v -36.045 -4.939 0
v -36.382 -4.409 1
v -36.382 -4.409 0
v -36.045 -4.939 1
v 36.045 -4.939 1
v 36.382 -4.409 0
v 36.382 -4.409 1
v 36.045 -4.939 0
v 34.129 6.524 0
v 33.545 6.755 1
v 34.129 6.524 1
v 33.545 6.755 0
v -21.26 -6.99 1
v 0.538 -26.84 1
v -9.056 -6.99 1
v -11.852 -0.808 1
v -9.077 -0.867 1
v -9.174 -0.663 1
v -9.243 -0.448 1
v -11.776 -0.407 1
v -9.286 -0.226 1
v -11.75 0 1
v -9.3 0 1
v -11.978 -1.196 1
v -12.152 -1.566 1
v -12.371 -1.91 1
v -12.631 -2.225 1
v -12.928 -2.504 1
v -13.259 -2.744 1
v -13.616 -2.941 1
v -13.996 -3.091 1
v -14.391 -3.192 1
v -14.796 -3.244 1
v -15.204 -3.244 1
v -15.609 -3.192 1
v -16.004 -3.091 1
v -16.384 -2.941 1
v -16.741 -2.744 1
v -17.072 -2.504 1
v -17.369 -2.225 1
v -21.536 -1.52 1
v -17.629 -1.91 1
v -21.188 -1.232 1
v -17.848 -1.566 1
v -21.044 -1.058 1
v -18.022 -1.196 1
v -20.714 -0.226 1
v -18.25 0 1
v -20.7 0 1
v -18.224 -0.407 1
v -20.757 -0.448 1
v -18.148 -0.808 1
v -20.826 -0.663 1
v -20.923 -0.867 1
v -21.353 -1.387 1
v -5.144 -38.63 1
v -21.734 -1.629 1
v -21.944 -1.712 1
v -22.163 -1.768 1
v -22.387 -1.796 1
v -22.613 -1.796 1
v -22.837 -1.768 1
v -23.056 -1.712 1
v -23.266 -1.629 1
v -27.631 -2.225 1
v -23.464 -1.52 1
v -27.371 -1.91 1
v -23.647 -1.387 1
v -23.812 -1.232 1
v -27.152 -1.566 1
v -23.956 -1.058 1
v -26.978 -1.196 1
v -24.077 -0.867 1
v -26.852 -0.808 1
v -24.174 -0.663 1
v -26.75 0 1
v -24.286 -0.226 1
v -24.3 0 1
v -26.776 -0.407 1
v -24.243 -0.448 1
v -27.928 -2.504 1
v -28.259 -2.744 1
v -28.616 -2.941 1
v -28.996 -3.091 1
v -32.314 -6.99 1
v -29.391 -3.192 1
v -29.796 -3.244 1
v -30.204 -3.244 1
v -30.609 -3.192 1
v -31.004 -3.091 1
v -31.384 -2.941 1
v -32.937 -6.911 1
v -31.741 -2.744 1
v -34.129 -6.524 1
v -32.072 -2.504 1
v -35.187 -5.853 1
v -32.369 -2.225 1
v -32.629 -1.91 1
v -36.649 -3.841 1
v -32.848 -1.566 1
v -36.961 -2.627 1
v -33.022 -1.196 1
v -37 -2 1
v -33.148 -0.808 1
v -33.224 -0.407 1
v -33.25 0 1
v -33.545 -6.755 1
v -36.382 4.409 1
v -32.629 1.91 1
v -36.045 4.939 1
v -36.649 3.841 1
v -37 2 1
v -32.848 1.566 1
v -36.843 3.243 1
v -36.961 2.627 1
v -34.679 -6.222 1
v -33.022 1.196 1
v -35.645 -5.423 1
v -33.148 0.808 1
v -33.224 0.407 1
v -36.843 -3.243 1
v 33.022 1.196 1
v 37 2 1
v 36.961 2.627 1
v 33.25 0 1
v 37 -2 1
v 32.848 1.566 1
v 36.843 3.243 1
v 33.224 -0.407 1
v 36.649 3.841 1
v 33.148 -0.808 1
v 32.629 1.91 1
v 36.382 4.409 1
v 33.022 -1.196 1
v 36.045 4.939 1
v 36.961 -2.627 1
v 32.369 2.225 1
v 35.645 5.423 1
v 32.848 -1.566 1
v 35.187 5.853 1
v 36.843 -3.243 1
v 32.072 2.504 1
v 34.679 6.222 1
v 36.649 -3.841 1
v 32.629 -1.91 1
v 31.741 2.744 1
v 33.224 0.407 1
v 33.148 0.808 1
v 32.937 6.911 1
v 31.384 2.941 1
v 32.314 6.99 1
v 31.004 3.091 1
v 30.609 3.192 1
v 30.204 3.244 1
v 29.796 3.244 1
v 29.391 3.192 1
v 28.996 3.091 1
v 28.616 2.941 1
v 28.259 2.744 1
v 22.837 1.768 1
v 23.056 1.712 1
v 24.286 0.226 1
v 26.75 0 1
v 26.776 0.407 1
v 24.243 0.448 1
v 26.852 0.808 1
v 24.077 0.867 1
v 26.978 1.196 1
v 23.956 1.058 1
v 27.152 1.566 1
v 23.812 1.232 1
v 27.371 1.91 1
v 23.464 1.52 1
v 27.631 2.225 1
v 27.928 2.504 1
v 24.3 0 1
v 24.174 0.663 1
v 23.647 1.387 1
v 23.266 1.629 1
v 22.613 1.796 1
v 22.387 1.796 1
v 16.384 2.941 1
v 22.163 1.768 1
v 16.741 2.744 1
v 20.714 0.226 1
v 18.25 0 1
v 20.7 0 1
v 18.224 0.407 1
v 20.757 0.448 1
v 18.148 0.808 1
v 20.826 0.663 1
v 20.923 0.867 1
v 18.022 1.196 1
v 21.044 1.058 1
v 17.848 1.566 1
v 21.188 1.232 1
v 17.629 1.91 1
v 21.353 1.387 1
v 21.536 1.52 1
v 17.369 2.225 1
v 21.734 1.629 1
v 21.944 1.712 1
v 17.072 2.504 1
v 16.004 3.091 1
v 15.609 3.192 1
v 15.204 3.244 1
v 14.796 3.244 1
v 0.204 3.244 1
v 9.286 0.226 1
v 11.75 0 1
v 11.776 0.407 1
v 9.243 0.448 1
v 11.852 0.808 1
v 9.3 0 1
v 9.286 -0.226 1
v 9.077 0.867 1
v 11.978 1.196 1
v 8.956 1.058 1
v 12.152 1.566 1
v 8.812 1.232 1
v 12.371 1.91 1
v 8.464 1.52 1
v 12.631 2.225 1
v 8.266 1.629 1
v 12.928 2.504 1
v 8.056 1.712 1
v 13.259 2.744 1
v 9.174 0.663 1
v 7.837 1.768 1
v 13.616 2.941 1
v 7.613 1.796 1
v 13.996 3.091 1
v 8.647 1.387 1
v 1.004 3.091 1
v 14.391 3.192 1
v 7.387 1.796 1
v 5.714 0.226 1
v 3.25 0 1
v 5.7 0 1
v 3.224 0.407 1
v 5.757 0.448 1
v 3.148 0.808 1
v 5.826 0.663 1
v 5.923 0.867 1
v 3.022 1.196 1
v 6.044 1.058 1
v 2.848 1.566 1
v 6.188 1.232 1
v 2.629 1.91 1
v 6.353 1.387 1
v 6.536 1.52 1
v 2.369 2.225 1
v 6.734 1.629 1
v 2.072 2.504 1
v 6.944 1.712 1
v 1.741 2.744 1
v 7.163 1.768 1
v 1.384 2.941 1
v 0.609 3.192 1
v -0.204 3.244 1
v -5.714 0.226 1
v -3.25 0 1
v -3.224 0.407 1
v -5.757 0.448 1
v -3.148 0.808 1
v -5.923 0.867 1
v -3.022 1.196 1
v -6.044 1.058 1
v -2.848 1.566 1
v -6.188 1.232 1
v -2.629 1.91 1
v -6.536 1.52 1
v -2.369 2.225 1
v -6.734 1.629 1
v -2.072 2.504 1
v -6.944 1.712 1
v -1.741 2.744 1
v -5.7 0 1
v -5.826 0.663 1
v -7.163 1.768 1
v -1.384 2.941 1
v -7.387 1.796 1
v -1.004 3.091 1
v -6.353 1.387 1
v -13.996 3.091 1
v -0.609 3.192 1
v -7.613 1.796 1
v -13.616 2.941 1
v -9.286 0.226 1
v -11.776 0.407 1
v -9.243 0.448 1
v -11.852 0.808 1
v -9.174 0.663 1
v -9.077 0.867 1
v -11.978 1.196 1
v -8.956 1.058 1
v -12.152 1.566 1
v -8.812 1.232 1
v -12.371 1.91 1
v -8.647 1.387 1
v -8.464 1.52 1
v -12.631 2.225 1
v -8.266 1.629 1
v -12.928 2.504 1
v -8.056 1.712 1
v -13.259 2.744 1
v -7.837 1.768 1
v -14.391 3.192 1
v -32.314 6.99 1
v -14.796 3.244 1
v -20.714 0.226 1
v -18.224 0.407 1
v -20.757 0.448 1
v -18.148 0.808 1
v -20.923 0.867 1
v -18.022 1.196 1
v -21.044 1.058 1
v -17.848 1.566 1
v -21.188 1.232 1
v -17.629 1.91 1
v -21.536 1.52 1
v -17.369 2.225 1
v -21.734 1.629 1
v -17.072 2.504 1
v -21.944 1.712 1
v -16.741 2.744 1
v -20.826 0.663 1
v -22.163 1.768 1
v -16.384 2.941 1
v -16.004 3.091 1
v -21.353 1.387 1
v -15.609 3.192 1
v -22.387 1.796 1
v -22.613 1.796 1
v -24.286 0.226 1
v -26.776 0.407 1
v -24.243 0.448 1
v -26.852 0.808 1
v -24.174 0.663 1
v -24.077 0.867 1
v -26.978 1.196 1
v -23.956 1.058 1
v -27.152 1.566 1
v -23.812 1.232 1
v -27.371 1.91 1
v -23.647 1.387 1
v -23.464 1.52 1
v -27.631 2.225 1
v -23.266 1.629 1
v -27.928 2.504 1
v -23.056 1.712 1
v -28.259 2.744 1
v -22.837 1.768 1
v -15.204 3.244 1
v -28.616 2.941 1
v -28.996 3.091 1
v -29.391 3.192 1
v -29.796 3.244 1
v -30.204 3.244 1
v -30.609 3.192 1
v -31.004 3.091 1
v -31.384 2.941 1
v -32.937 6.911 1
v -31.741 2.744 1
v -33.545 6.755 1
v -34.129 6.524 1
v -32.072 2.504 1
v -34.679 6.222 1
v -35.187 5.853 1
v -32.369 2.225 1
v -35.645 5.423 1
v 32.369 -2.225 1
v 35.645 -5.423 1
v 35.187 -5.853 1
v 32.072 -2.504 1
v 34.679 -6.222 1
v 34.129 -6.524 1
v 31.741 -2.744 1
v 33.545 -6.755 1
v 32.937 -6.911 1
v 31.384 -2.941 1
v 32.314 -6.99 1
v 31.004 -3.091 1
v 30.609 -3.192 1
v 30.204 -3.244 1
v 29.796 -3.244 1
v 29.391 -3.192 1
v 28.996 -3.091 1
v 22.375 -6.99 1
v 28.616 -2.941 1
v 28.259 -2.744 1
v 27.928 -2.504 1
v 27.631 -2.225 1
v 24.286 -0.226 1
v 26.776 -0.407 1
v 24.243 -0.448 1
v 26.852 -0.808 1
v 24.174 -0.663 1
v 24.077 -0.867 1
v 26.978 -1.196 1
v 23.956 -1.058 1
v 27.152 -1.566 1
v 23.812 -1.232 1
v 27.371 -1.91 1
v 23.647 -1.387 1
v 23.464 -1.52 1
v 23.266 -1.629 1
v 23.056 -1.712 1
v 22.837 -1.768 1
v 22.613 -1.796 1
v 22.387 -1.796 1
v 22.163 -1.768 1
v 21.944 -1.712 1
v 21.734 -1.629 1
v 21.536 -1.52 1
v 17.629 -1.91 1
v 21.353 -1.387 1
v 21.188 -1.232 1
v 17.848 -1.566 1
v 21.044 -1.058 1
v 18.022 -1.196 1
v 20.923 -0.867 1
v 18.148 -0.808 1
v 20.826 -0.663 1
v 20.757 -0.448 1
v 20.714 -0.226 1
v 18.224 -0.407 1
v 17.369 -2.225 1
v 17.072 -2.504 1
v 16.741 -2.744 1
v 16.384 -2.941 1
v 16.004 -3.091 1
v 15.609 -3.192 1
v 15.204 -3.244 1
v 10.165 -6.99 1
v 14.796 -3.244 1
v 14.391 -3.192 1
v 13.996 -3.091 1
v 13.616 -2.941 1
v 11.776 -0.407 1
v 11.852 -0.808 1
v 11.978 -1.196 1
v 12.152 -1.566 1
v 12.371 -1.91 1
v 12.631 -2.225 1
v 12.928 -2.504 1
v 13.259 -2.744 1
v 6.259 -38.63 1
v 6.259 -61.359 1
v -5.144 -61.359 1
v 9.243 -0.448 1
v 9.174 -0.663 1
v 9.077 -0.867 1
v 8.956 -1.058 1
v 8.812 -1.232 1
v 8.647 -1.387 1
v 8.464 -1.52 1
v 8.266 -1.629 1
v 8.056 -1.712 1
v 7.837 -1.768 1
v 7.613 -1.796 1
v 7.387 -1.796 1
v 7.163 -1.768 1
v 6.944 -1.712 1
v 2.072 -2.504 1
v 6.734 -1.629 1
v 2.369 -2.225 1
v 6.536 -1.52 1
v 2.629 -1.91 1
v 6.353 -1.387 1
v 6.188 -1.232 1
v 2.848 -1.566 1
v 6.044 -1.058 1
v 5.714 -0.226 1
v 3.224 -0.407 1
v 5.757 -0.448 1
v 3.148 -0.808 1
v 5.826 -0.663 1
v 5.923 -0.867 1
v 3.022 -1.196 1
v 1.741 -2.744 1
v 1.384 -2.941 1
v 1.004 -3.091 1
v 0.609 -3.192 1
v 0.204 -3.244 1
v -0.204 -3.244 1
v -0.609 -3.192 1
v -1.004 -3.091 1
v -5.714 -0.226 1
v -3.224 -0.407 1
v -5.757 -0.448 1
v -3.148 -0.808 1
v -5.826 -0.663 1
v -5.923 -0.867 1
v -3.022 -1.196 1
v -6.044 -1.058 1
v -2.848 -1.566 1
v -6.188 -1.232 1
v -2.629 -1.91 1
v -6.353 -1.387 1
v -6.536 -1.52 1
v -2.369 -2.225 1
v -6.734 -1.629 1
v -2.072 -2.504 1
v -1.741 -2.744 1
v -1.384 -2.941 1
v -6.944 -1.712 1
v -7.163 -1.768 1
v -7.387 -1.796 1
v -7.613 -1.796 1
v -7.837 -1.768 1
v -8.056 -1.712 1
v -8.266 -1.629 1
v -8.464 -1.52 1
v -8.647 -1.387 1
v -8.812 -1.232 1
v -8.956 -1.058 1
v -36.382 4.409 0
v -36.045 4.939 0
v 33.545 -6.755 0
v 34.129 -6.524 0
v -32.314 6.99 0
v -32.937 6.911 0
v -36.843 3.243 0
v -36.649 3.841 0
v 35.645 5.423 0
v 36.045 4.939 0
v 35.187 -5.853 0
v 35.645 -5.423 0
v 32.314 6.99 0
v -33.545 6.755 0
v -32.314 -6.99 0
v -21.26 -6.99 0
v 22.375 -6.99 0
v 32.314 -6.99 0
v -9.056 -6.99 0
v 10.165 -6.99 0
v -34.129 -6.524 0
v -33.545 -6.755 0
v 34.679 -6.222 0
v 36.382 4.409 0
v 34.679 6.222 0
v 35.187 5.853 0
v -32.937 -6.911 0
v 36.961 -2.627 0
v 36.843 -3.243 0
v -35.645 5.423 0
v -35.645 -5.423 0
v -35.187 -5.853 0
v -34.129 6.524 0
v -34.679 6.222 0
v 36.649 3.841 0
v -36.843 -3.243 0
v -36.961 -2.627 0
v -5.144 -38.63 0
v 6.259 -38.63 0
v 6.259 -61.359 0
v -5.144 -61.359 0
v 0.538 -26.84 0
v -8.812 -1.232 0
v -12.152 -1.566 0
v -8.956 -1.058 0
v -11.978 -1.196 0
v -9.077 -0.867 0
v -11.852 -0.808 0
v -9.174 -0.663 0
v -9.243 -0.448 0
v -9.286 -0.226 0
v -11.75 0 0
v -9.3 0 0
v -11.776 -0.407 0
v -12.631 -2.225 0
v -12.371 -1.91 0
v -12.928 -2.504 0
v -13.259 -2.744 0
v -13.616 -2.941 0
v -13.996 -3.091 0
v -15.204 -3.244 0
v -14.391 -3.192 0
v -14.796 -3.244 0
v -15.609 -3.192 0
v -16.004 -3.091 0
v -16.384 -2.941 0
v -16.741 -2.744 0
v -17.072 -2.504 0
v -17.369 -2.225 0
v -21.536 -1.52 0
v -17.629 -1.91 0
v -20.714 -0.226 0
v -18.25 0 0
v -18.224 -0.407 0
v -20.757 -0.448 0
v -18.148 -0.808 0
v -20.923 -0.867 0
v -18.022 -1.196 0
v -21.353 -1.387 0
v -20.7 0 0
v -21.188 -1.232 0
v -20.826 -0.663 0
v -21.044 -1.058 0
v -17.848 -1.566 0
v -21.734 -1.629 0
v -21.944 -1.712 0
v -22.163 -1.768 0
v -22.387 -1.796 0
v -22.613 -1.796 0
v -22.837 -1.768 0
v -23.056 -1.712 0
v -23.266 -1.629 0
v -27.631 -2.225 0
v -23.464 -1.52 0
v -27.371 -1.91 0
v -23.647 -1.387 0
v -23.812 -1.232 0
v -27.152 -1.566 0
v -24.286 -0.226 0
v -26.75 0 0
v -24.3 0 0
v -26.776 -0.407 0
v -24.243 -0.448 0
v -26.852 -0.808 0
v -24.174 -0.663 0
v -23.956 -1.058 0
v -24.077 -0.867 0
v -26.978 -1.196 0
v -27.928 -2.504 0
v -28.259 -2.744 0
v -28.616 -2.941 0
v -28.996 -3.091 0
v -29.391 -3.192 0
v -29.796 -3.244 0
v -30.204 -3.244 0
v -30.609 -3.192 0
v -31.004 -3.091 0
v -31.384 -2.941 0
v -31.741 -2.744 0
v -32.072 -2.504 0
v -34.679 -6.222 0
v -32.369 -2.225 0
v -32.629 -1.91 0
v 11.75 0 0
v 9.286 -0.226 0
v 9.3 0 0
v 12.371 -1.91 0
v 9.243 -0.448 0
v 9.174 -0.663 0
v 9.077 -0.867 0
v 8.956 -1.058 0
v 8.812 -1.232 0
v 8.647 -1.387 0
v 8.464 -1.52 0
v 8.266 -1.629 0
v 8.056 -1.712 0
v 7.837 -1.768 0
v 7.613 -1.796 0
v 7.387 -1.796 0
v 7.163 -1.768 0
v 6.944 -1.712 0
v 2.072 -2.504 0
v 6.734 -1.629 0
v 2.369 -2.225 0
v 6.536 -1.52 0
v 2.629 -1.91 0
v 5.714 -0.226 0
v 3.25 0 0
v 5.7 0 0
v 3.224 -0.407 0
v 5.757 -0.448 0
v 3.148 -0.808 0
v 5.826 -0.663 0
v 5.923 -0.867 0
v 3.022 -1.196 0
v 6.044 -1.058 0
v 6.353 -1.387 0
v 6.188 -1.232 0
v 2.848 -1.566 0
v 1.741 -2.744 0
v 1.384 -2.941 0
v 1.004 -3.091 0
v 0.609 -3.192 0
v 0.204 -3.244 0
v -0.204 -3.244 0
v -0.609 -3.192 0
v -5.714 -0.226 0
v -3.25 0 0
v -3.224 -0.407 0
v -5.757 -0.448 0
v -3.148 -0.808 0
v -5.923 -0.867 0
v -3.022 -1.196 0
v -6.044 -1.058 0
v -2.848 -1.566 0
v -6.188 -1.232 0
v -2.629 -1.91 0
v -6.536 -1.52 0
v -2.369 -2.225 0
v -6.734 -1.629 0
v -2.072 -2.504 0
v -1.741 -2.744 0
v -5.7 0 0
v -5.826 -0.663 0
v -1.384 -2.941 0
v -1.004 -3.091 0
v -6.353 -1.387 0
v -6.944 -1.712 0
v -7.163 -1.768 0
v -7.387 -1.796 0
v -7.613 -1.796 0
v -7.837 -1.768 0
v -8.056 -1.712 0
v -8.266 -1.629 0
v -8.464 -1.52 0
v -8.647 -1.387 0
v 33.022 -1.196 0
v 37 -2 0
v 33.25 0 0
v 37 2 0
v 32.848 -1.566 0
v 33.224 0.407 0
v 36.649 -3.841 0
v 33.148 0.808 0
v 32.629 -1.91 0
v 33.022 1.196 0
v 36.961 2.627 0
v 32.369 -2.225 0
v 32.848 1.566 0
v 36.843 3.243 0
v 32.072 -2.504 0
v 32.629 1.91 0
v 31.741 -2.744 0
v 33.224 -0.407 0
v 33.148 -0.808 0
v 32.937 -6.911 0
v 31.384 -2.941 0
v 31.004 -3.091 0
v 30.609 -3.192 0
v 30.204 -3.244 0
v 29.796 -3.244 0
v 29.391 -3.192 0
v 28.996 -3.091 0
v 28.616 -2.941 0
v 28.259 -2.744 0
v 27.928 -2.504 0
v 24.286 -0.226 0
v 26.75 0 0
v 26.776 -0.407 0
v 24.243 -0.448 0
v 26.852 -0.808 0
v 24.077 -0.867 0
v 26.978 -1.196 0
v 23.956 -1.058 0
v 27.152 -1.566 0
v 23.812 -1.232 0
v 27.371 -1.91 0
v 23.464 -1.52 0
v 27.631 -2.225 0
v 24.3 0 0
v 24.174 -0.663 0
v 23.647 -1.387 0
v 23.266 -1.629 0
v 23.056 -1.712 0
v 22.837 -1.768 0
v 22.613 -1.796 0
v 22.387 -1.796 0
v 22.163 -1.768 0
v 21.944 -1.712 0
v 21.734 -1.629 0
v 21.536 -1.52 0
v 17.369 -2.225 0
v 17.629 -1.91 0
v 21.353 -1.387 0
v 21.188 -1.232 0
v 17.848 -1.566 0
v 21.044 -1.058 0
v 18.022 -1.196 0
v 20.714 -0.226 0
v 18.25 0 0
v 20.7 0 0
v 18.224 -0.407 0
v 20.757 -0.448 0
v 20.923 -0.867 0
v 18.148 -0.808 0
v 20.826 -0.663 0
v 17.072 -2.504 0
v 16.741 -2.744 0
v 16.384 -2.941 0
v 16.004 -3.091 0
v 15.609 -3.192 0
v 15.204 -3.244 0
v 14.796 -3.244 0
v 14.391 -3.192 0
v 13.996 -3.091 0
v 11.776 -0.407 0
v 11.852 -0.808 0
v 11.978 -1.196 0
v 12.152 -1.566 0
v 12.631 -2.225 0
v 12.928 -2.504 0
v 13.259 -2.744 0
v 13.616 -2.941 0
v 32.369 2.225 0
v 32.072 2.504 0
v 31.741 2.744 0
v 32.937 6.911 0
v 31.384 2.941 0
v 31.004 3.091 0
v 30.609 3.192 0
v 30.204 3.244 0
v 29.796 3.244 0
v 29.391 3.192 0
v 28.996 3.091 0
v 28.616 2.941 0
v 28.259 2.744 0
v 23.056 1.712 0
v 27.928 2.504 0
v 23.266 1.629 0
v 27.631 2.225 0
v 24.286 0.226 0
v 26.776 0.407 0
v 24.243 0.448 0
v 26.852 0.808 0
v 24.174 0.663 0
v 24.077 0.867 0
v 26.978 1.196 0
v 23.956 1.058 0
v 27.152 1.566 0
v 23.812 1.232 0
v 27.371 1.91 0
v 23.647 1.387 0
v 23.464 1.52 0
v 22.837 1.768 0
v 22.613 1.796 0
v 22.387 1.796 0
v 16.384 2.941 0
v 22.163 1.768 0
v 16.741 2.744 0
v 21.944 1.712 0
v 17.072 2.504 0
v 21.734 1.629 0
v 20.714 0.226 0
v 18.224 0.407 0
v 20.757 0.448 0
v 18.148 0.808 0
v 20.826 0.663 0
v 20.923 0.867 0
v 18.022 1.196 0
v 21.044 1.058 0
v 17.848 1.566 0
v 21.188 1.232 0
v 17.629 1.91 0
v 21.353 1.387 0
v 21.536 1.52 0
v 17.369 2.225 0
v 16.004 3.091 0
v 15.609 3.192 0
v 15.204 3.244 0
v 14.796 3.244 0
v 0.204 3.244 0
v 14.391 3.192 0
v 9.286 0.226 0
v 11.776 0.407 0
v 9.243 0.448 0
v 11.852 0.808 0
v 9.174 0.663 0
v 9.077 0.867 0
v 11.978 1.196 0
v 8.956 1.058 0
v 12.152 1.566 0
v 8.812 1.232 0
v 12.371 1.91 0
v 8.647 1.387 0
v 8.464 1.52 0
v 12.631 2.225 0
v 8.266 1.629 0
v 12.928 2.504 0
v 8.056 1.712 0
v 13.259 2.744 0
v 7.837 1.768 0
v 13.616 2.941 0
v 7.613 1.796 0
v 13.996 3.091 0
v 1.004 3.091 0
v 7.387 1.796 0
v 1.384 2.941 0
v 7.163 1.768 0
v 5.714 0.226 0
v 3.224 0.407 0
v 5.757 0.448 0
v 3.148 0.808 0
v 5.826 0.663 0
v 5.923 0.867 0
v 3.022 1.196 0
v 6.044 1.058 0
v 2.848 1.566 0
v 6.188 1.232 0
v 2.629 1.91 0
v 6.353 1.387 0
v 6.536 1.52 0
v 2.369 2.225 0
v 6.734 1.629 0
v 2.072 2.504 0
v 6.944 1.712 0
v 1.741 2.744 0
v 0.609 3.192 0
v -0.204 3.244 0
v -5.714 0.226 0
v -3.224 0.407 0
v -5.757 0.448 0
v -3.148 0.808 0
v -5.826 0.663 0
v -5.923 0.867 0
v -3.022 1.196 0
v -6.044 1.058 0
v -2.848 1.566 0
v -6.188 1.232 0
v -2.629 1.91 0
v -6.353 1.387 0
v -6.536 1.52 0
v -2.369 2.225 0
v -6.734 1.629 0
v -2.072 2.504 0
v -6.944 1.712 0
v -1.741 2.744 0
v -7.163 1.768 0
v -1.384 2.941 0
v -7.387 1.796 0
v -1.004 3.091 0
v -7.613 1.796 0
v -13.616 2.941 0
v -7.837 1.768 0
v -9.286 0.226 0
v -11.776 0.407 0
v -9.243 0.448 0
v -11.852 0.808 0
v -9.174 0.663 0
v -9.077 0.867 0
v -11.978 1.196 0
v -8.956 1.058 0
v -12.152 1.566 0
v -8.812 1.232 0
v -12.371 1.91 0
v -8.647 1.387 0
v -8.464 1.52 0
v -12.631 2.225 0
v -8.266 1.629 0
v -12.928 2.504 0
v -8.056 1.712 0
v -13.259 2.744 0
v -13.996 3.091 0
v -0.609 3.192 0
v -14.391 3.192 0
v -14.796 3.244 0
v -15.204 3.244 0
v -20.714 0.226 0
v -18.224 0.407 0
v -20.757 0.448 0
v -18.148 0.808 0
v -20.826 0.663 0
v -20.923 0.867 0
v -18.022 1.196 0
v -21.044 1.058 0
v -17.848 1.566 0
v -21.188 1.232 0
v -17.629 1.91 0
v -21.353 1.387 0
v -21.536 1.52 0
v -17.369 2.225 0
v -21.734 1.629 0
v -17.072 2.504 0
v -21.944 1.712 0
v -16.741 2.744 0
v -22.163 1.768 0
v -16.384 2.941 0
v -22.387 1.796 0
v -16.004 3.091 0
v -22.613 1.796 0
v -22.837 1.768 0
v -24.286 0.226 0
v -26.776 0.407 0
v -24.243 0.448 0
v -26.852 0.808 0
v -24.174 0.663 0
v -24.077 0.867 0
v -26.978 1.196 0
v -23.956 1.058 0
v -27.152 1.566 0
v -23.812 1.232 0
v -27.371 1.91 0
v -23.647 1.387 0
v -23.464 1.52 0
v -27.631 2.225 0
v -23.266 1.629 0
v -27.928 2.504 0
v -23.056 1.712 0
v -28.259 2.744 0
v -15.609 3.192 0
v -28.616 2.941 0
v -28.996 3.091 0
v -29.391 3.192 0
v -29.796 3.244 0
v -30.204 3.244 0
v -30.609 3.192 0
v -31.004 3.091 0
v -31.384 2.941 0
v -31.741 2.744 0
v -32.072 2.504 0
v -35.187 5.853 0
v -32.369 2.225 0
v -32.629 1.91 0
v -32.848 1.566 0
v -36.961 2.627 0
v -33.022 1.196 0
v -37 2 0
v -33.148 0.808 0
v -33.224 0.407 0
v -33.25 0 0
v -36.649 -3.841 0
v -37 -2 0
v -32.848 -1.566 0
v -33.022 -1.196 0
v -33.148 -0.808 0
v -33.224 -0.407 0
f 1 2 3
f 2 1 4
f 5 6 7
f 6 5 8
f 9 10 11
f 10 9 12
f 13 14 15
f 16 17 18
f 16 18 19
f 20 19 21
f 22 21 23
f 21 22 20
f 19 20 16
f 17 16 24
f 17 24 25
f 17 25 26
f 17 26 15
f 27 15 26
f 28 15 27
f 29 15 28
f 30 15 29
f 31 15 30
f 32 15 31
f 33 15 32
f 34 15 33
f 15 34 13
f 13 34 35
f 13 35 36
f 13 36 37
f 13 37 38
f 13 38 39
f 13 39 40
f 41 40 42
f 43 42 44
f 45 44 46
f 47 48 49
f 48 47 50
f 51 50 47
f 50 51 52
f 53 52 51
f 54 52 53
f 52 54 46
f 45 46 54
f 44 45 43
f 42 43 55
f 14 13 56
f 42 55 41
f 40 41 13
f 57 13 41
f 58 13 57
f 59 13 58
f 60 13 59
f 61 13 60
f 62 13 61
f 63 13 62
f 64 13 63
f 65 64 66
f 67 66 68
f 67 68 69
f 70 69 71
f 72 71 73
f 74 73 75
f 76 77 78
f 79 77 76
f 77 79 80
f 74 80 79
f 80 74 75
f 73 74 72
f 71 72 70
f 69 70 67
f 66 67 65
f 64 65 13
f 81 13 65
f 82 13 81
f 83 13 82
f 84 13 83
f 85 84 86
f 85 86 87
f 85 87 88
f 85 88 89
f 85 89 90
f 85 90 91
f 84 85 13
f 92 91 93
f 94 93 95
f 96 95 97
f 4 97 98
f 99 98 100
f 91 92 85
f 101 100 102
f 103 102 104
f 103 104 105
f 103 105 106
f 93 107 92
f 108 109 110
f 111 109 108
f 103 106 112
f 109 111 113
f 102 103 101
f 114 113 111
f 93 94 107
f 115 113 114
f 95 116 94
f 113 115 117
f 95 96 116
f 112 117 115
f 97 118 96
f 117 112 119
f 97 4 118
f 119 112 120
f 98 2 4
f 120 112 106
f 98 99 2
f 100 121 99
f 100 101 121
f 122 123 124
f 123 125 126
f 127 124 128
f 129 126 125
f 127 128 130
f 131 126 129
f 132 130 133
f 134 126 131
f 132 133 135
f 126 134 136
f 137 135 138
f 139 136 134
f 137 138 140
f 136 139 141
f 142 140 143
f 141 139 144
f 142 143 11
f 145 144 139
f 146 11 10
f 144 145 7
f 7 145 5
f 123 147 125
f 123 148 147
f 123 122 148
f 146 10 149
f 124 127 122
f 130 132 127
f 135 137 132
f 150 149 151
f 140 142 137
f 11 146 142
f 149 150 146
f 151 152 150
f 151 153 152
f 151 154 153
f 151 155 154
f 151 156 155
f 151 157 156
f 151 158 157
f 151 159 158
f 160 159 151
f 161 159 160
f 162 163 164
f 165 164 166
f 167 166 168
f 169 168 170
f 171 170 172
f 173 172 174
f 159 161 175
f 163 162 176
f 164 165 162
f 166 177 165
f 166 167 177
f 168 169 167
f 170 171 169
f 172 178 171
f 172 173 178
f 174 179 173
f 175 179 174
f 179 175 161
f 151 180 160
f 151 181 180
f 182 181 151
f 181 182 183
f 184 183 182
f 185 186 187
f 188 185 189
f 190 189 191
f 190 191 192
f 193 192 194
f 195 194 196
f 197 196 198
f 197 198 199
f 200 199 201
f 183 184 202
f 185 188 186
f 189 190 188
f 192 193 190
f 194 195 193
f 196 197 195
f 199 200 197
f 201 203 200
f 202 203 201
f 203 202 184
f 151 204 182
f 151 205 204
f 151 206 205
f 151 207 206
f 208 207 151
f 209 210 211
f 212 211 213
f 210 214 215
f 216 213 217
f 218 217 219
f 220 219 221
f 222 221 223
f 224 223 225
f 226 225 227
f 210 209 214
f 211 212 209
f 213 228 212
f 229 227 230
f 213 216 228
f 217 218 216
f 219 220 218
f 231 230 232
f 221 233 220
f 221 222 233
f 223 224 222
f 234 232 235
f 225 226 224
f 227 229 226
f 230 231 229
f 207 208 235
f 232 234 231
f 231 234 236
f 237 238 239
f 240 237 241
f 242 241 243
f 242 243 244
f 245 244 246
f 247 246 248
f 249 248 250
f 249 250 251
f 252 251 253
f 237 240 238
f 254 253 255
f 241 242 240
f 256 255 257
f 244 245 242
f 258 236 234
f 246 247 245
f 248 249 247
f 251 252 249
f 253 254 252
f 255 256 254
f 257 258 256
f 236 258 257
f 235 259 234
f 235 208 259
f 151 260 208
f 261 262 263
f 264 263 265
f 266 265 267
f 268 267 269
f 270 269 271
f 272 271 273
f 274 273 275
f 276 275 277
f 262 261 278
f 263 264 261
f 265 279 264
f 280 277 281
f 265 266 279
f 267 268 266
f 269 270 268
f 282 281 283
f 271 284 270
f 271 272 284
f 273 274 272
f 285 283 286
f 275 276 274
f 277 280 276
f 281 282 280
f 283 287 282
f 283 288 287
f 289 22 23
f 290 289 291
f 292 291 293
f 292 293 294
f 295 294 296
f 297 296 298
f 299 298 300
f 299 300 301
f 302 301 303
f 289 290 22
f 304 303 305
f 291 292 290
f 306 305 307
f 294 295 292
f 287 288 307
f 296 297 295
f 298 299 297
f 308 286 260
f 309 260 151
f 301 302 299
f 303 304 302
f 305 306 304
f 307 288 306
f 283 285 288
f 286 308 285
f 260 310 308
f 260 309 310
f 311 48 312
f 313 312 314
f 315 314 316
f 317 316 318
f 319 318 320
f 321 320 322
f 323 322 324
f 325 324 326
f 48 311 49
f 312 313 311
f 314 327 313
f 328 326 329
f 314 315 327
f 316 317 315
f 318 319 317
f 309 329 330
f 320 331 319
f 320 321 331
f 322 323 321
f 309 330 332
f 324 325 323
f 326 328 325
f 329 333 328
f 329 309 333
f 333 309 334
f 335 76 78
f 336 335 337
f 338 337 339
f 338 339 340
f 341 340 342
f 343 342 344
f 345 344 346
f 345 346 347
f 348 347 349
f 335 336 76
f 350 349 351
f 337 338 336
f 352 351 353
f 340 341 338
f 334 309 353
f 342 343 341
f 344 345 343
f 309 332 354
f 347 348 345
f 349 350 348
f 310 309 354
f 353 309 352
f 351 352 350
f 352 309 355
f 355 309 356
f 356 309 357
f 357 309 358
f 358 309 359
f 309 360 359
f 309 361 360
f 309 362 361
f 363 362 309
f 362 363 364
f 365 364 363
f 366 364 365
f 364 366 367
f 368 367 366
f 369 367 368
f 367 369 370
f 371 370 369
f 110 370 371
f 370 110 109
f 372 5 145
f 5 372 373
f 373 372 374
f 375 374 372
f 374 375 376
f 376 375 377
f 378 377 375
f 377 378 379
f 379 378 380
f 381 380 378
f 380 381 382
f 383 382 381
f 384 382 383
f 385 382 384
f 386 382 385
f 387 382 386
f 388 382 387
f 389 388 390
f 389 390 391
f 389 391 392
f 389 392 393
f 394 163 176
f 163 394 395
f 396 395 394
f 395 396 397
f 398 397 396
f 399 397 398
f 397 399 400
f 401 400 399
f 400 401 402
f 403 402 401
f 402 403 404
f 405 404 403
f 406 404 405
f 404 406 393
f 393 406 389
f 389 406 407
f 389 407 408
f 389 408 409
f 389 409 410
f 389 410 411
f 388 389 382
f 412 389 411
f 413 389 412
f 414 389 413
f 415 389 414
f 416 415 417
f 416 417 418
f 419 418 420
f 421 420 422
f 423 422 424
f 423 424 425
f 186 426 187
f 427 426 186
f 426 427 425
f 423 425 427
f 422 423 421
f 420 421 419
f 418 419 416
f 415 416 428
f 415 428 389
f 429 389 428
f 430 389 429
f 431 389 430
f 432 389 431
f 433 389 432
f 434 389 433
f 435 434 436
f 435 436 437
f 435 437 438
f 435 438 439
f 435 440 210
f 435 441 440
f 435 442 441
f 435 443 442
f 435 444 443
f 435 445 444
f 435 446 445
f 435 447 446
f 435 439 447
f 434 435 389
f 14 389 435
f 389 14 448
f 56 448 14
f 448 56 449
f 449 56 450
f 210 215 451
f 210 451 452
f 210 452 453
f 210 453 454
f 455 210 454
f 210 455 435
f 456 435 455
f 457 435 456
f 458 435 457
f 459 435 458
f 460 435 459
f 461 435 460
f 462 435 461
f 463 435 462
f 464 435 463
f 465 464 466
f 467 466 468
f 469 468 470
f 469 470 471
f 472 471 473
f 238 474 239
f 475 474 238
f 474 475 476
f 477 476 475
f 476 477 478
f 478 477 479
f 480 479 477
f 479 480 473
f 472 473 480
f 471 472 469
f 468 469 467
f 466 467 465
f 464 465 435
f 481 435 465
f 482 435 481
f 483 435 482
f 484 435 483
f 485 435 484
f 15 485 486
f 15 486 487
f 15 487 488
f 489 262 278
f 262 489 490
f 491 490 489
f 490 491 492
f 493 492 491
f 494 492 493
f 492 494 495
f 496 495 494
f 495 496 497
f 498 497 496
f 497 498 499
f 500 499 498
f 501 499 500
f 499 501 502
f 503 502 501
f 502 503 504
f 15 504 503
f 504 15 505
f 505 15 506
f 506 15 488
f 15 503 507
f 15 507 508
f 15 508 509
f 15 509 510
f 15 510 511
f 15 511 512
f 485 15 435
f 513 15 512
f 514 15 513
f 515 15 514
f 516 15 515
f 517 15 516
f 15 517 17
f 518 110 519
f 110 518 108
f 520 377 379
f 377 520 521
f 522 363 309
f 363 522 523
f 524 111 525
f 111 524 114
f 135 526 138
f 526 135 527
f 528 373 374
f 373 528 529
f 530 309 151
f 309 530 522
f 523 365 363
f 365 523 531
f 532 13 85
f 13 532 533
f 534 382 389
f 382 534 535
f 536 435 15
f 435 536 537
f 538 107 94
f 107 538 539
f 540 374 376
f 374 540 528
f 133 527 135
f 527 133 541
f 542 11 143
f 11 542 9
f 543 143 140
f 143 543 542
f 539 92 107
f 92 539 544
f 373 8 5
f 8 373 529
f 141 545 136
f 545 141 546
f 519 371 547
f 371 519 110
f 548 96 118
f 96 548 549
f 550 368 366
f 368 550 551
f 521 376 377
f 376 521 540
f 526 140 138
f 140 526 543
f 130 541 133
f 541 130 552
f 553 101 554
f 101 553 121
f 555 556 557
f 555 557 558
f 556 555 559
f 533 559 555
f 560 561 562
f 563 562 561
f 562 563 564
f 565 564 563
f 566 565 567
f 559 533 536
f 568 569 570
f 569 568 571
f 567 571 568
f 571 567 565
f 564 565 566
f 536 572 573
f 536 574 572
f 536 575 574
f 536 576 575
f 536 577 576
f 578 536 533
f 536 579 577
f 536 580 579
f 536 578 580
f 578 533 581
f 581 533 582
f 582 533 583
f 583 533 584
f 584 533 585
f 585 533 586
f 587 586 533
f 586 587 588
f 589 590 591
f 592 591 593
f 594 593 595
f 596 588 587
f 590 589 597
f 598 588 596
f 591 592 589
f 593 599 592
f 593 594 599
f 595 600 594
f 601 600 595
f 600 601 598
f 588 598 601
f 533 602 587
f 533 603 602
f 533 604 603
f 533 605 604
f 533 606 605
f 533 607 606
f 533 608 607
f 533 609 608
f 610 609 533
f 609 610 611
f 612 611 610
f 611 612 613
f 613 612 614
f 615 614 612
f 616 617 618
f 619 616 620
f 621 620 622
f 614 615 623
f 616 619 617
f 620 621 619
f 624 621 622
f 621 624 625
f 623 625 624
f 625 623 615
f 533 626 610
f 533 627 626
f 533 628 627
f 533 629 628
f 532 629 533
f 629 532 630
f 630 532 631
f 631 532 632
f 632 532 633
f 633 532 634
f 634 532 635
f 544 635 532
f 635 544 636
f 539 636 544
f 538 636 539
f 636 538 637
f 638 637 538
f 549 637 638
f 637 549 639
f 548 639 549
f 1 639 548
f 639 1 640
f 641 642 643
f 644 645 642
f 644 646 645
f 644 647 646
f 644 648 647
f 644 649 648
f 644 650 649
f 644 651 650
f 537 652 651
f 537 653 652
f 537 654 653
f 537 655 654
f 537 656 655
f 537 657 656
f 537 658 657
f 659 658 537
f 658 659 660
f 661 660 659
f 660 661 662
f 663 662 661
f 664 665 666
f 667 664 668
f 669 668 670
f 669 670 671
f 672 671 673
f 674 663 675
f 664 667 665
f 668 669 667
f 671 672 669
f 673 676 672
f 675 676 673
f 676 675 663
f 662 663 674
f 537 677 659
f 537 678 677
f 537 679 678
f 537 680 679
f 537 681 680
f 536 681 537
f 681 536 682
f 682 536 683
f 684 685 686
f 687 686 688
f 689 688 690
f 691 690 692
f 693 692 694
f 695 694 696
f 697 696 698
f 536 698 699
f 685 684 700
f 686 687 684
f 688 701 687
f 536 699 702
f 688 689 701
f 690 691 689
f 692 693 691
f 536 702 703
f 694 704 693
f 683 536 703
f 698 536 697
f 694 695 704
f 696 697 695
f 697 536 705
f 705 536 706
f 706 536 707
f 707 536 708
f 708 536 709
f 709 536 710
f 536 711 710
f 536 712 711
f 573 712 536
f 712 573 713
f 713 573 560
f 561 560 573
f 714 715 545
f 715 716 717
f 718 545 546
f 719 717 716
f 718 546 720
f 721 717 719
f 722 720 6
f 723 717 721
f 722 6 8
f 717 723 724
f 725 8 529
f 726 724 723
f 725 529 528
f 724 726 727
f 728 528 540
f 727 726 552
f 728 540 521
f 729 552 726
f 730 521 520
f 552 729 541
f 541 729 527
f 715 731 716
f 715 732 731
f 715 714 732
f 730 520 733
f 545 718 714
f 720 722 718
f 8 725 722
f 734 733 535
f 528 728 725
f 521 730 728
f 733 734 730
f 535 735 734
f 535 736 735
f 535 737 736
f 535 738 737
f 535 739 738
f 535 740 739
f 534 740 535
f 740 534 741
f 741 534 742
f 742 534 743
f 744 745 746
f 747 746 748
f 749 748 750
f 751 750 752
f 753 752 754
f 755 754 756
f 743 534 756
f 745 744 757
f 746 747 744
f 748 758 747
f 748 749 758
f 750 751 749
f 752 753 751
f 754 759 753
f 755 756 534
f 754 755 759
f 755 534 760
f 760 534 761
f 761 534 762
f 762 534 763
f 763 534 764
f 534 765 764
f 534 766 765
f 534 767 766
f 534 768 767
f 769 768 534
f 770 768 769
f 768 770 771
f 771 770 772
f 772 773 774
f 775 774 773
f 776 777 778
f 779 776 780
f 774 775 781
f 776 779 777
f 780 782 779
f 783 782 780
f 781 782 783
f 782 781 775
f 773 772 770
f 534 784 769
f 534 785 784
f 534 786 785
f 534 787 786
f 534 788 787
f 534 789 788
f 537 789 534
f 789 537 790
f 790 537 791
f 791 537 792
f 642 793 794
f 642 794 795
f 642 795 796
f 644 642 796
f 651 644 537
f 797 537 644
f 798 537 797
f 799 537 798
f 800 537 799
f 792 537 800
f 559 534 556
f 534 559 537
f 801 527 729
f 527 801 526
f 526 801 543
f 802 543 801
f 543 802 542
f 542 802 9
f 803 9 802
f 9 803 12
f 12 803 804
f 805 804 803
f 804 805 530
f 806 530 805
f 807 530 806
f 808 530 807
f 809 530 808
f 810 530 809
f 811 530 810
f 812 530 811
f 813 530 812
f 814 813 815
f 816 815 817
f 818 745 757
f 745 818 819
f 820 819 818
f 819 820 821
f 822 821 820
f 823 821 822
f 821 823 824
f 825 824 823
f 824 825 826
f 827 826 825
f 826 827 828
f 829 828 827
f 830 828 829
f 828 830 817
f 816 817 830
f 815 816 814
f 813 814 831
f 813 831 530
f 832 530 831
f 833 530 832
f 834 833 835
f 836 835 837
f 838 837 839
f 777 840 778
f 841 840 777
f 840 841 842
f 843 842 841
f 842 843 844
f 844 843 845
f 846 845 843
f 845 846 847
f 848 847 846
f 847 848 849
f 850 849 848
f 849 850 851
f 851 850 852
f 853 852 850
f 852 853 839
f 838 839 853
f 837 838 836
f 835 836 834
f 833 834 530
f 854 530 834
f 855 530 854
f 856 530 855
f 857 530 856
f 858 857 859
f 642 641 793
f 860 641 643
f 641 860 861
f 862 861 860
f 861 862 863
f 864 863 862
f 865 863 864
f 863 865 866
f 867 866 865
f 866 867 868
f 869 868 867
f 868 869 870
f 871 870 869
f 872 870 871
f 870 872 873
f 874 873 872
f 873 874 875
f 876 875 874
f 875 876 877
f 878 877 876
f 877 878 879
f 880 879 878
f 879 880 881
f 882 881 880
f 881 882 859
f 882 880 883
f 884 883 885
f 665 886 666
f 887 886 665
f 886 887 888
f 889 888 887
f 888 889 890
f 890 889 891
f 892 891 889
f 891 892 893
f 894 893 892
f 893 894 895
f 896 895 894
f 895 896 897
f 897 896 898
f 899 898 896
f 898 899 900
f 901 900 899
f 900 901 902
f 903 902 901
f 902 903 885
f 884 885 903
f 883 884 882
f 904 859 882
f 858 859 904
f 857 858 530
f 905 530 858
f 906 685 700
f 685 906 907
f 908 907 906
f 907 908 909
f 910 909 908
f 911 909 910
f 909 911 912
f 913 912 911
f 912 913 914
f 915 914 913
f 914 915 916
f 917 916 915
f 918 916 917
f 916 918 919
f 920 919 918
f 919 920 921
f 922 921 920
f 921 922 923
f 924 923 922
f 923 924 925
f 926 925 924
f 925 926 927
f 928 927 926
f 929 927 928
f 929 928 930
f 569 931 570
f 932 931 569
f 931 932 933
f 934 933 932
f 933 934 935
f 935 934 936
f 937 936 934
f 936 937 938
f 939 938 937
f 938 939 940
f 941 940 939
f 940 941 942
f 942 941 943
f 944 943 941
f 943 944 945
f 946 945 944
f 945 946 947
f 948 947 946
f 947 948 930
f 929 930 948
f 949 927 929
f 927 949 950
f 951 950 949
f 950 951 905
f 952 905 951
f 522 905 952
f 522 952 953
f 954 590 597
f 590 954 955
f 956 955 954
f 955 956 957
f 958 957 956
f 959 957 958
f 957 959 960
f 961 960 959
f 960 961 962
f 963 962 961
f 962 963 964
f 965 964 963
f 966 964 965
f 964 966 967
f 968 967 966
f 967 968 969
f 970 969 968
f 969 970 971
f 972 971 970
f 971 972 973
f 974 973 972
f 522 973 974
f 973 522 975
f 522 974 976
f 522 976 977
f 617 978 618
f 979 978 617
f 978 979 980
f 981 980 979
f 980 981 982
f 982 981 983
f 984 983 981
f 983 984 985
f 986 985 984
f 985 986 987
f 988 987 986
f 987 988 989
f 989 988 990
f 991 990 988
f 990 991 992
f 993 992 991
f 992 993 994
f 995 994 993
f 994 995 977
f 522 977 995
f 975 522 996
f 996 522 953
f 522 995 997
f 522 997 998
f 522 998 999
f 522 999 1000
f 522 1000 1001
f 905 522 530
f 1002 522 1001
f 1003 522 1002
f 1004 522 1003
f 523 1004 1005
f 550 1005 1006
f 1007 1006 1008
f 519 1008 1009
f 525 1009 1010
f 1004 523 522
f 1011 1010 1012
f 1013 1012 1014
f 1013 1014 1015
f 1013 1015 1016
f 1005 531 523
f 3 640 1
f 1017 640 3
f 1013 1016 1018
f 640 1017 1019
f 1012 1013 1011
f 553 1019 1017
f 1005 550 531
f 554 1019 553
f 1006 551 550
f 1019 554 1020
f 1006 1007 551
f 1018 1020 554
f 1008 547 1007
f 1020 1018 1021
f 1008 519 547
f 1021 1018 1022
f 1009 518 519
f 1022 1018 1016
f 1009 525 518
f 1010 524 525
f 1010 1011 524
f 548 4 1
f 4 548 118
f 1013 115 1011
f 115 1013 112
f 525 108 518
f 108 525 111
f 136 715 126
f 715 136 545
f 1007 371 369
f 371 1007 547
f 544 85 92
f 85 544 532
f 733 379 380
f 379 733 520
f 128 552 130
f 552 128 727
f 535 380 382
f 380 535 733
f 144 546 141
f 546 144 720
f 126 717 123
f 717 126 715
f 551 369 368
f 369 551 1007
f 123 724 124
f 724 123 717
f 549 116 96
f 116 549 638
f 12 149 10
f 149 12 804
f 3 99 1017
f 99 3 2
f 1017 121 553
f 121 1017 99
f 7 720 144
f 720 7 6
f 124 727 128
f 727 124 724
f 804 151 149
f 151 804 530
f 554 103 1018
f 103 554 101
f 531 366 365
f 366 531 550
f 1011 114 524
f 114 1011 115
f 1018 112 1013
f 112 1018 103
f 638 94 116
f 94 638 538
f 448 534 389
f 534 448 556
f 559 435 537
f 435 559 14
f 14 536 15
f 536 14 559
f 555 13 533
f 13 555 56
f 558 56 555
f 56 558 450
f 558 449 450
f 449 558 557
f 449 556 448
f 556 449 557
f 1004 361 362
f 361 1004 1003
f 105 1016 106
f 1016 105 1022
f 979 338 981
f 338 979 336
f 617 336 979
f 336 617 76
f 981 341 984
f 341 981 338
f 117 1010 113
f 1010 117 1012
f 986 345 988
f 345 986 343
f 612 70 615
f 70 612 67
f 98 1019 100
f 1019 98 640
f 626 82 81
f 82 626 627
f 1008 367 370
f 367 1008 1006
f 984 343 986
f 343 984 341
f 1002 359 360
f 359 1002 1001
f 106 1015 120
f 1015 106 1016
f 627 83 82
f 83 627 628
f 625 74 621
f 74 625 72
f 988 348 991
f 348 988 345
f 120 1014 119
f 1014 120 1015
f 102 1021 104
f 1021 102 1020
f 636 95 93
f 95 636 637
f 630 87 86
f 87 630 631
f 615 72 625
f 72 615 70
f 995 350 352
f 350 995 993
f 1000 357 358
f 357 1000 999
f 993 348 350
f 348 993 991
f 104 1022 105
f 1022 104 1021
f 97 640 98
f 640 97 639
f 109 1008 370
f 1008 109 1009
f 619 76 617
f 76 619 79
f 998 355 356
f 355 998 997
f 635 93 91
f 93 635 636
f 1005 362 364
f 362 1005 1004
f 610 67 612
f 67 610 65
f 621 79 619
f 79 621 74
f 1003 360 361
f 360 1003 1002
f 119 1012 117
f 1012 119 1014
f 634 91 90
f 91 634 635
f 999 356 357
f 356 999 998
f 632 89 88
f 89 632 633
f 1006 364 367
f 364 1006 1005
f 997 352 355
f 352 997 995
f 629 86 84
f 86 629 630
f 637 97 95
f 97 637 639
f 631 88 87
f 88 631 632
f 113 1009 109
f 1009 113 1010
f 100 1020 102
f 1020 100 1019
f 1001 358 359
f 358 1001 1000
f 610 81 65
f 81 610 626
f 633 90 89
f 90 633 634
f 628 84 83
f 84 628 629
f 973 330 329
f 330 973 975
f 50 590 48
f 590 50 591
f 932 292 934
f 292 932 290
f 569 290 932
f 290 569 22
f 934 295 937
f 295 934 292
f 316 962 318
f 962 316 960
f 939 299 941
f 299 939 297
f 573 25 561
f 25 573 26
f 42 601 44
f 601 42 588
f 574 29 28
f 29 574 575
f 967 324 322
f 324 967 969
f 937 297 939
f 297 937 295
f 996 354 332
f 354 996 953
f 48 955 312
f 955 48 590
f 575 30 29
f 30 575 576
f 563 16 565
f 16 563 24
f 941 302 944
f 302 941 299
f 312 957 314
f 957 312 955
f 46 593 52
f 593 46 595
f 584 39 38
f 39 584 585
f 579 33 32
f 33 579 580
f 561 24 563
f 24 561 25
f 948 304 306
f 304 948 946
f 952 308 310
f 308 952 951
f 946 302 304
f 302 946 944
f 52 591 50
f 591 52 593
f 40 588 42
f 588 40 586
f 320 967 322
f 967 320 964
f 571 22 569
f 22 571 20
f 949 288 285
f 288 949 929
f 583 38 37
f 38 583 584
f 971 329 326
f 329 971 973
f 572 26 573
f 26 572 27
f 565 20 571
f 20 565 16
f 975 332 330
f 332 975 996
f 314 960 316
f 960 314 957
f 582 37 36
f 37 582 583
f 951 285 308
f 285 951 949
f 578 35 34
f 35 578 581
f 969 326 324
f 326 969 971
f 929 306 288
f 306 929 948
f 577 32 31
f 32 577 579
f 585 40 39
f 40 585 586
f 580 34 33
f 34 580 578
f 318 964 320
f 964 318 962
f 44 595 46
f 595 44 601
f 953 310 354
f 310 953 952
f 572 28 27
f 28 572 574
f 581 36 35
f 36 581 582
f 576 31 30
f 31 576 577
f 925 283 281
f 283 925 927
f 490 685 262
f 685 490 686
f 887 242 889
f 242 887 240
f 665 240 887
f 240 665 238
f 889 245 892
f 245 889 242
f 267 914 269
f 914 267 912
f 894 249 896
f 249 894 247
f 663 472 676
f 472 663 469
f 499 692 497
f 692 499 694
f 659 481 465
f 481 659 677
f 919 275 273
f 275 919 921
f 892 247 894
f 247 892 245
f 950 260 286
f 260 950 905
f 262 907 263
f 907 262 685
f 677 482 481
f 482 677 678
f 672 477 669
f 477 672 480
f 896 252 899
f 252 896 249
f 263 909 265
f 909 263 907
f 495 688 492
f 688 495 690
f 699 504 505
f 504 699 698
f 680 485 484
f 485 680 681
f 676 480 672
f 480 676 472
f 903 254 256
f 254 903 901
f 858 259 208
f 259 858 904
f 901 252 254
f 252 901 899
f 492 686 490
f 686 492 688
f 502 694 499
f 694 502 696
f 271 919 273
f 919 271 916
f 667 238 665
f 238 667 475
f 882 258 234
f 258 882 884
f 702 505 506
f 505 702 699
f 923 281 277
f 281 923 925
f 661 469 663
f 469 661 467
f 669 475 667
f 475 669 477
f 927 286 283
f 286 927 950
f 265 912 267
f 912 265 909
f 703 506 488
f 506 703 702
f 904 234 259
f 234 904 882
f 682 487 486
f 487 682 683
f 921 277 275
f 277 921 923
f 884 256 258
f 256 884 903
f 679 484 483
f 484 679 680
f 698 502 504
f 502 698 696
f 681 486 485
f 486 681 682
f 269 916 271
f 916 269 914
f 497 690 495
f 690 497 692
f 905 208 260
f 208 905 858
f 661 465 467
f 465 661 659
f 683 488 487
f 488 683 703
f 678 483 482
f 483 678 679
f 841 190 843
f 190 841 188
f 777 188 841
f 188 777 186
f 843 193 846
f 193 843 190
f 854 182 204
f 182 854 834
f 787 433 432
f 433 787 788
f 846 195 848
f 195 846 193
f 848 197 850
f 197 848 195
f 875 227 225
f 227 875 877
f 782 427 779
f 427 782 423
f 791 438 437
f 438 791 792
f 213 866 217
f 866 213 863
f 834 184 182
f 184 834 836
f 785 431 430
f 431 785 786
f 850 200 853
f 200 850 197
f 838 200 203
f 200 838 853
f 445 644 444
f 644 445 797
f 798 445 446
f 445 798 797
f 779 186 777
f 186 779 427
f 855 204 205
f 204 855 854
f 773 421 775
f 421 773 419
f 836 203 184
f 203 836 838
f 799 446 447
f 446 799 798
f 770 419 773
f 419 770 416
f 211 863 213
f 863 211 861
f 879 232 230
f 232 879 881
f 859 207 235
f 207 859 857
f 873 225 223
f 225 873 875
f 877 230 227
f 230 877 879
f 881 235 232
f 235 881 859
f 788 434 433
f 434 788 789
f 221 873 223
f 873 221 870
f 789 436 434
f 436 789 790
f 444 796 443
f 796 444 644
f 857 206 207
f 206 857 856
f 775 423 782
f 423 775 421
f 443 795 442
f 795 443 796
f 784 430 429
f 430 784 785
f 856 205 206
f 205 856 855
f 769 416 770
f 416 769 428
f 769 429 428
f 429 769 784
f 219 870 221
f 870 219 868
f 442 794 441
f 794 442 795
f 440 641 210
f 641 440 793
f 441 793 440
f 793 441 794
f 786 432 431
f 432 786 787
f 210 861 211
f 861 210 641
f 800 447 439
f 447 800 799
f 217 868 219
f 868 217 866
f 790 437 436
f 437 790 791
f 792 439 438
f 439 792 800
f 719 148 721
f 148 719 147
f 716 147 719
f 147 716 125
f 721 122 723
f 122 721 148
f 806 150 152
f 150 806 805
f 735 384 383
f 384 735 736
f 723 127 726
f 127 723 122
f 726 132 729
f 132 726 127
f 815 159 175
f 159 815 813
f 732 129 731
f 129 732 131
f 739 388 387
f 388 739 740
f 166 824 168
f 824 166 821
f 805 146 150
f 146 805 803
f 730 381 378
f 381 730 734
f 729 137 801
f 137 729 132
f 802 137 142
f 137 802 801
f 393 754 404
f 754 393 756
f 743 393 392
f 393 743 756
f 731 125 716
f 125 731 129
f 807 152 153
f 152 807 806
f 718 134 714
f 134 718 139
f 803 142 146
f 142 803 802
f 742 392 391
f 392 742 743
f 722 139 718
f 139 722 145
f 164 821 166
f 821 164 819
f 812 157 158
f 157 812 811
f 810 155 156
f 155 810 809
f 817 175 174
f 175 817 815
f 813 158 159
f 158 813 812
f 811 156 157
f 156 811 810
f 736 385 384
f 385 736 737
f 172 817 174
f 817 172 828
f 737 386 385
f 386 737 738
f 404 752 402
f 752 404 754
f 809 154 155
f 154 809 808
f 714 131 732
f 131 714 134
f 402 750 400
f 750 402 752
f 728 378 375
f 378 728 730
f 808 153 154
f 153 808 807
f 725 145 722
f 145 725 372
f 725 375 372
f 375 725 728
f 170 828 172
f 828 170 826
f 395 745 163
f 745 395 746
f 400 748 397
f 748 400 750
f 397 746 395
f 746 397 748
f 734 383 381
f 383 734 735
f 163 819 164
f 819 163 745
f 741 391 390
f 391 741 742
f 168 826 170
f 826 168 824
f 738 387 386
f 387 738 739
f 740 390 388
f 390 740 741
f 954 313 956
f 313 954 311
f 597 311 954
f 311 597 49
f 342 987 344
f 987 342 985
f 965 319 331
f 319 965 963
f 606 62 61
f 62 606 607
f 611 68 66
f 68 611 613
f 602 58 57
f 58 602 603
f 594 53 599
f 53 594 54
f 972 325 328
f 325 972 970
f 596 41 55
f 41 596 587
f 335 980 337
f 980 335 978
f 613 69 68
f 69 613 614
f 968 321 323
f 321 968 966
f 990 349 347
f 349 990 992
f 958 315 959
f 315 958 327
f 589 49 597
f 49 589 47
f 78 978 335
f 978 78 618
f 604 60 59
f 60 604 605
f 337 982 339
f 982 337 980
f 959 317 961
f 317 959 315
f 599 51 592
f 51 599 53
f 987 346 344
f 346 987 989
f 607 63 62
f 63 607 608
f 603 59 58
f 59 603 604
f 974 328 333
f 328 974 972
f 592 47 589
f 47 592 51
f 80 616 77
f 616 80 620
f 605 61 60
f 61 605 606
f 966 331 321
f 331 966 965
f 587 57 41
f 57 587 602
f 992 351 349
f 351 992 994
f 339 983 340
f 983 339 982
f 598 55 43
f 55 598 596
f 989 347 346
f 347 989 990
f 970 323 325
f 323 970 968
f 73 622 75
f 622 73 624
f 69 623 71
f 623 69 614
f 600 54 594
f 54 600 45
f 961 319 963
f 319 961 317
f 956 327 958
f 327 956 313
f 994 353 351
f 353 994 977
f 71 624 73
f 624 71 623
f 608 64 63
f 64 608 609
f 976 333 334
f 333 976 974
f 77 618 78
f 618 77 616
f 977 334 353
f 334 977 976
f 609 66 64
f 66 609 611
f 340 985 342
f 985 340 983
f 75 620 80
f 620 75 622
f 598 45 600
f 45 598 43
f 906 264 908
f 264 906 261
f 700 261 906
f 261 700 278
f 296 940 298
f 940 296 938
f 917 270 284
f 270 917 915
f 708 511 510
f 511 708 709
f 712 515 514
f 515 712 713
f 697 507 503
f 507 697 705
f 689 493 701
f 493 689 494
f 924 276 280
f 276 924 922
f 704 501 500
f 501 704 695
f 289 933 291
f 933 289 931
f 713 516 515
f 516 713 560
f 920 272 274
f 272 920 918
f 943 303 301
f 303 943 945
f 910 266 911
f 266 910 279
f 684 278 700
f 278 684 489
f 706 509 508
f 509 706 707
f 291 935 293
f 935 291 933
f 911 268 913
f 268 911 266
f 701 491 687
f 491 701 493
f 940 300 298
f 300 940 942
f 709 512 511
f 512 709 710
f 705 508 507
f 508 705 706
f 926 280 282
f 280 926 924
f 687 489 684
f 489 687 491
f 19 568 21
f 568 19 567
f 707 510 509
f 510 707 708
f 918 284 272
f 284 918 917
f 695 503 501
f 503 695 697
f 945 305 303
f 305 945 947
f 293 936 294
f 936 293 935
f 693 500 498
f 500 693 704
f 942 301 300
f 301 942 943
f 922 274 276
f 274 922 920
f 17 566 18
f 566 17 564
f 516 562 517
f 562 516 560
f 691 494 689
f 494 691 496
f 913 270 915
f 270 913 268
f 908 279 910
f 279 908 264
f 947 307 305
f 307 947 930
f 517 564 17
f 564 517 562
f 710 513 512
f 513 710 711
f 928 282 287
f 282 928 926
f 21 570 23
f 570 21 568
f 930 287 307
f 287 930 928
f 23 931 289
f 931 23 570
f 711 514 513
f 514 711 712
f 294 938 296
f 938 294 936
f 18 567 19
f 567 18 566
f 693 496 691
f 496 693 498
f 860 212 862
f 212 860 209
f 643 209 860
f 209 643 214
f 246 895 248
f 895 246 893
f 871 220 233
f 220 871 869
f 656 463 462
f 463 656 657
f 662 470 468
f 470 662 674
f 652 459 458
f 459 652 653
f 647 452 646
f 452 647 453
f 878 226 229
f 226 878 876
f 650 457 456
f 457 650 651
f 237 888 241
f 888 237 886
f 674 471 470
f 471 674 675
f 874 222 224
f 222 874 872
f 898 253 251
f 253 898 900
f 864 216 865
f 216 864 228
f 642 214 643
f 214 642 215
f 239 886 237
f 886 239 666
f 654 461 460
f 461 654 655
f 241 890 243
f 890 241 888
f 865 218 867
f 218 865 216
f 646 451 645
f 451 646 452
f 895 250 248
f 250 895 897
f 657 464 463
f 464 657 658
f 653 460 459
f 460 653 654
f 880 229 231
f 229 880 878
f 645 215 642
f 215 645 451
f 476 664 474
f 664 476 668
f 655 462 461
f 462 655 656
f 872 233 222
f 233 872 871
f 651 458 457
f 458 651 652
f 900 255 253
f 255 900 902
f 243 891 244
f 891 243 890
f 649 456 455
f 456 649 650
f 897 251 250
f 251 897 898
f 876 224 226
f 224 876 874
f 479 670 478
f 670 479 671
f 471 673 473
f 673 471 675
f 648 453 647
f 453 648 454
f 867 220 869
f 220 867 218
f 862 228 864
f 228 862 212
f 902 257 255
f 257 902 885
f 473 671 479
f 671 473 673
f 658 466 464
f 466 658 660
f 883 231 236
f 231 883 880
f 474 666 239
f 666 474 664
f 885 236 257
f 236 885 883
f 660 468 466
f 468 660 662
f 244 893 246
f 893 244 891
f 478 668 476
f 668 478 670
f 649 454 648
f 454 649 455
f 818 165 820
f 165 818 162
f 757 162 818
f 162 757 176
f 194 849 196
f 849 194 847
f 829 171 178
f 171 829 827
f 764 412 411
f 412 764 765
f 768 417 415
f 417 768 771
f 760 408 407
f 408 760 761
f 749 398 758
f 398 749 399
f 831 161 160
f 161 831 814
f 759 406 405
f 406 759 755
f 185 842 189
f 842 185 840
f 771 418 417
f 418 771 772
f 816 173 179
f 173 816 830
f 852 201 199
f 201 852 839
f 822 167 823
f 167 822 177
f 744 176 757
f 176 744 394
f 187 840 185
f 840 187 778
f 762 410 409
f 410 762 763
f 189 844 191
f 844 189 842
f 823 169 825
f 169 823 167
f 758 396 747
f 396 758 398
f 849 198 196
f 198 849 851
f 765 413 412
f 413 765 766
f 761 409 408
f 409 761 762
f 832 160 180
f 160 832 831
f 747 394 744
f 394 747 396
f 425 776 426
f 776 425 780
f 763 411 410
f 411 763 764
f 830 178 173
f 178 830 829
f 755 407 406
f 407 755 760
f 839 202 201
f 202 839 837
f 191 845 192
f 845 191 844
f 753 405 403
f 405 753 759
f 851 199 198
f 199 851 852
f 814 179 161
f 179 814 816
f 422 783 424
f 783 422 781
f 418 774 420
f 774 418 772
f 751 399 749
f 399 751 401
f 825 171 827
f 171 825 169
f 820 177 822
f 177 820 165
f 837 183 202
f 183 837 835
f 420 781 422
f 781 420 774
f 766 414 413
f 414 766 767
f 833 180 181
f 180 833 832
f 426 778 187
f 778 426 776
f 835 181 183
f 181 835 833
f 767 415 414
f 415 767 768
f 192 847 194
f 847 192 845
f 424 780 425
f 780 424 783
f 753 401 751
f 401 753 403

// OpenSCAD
$fn = 50;


difference() {
	union() {
		hull() {
			translate(v = [-32.0000000000, 2.0000000000, 0]) {
				cylinder(h = 1, r = 5);
			}
			translate(v = [32.0000000000, 2.0000000000, 0]) {
				cylinder(h = 1, r = 5);
			}
			translate(v = [-32.0000000000, -2.0000000000, 0]) {
				cylinder(h = 1, r = 5);
			}
			translate(v = [32.0000000000, -2.0000000000, 0]) {
				cylinder(h = 1, r = 5);
			}
		}
		translate(v = [0, -5, 0]) {
			linear_extrude(height = 1) {
				text(font = "DejaVu Sans Mono:style=Bold", halign = "center", size = 57.0000000000, text = "Y", valign = "top");
			}
		}
	}
	union() {
		translate(v = [-30.0000000000, 0.0000000000, 0]) {
			translate(v = [0, 0, -100]) {
				cylinder(h = 200, r = 3.2500000000);
			}
		}
		translate(v = [-15.0000000000, 0.0000000000, 0]) {
			translate(v = [0, 0, -100]) {
				cylinder(h = 200, r = 3.2500000000);
			}
		}
		translate(v = [0, 0, -100]) {
			cylinder(h = 200, r = 3.2500000000);
		}
		translate(v = [15.0000000000, 0.0000000000, 0]) {
			translate(v = [0, 0, -100]) {
				cylinder(h = 200, r = 3.2500000000);
			}
		}
		translate(v = [30.0000000000, 0.0000000000, 0]) {
			translate(v = [0, 0, -100]) {
				cylinder(h = 200, r = 3.2500000000);
			}
		}
		translate(v = [-30.0000000000, 0.0000000000, 0]) {
			translate(v = [0, 0, -100]) {
				cylinder(h = 200, r = 1.8000000000);
			}
		}
		translate(v = [-22.5000000000, 0.0000000000, 0]) {
			translate(v = [0, 0, -100]) {
				cylinder(h = 200, r = 1.8000000000);
			}
		}
		translate(v = [-15.0000000000, 0.0000000000, 0]) {
			translate(v = [0, 0, -100]) {
				cylinder(h = 200, r = 1.8000000000);
			}
		}
		translate(v = [-7.5000000000, 0.0000000000, 0]) {
			translate(v = [0, 0, -100]) {
				cylinder(h = 200, r = 1.8000000000);
			}
		}
		translate(v = [0, 0, -100]) {
			cylinder(h = 200, r = 1.8000000000);
		}
		translate(v = [7.5000000000, 0.0000000000, 0]) {
			translate(v = [0, 0, -100]) {
				cylinder(h = 200, r = 1.8000000000);
			}
		}
		translate(v = [15.0000000000, 0.0000000000, 0]) {
			translate(v = [0, 0, -100]) {
				cylinder(h = 200, r = 1.8000000000);
			}
		}
		translate(v = [22.5000000000, 0.0000000000, 0]) {
			translate(v = [0, 0, -100]) {
				cylinder(h = 200, r = 1.8000000000);
			}
		}
		translate(v = [30.0000000000, 0.0000000000, 0]) {
			translate(v = [0, 0, -100]) {
				cylinder(h = 200, r = 1.8000000000);
			}
		}
	}
}
